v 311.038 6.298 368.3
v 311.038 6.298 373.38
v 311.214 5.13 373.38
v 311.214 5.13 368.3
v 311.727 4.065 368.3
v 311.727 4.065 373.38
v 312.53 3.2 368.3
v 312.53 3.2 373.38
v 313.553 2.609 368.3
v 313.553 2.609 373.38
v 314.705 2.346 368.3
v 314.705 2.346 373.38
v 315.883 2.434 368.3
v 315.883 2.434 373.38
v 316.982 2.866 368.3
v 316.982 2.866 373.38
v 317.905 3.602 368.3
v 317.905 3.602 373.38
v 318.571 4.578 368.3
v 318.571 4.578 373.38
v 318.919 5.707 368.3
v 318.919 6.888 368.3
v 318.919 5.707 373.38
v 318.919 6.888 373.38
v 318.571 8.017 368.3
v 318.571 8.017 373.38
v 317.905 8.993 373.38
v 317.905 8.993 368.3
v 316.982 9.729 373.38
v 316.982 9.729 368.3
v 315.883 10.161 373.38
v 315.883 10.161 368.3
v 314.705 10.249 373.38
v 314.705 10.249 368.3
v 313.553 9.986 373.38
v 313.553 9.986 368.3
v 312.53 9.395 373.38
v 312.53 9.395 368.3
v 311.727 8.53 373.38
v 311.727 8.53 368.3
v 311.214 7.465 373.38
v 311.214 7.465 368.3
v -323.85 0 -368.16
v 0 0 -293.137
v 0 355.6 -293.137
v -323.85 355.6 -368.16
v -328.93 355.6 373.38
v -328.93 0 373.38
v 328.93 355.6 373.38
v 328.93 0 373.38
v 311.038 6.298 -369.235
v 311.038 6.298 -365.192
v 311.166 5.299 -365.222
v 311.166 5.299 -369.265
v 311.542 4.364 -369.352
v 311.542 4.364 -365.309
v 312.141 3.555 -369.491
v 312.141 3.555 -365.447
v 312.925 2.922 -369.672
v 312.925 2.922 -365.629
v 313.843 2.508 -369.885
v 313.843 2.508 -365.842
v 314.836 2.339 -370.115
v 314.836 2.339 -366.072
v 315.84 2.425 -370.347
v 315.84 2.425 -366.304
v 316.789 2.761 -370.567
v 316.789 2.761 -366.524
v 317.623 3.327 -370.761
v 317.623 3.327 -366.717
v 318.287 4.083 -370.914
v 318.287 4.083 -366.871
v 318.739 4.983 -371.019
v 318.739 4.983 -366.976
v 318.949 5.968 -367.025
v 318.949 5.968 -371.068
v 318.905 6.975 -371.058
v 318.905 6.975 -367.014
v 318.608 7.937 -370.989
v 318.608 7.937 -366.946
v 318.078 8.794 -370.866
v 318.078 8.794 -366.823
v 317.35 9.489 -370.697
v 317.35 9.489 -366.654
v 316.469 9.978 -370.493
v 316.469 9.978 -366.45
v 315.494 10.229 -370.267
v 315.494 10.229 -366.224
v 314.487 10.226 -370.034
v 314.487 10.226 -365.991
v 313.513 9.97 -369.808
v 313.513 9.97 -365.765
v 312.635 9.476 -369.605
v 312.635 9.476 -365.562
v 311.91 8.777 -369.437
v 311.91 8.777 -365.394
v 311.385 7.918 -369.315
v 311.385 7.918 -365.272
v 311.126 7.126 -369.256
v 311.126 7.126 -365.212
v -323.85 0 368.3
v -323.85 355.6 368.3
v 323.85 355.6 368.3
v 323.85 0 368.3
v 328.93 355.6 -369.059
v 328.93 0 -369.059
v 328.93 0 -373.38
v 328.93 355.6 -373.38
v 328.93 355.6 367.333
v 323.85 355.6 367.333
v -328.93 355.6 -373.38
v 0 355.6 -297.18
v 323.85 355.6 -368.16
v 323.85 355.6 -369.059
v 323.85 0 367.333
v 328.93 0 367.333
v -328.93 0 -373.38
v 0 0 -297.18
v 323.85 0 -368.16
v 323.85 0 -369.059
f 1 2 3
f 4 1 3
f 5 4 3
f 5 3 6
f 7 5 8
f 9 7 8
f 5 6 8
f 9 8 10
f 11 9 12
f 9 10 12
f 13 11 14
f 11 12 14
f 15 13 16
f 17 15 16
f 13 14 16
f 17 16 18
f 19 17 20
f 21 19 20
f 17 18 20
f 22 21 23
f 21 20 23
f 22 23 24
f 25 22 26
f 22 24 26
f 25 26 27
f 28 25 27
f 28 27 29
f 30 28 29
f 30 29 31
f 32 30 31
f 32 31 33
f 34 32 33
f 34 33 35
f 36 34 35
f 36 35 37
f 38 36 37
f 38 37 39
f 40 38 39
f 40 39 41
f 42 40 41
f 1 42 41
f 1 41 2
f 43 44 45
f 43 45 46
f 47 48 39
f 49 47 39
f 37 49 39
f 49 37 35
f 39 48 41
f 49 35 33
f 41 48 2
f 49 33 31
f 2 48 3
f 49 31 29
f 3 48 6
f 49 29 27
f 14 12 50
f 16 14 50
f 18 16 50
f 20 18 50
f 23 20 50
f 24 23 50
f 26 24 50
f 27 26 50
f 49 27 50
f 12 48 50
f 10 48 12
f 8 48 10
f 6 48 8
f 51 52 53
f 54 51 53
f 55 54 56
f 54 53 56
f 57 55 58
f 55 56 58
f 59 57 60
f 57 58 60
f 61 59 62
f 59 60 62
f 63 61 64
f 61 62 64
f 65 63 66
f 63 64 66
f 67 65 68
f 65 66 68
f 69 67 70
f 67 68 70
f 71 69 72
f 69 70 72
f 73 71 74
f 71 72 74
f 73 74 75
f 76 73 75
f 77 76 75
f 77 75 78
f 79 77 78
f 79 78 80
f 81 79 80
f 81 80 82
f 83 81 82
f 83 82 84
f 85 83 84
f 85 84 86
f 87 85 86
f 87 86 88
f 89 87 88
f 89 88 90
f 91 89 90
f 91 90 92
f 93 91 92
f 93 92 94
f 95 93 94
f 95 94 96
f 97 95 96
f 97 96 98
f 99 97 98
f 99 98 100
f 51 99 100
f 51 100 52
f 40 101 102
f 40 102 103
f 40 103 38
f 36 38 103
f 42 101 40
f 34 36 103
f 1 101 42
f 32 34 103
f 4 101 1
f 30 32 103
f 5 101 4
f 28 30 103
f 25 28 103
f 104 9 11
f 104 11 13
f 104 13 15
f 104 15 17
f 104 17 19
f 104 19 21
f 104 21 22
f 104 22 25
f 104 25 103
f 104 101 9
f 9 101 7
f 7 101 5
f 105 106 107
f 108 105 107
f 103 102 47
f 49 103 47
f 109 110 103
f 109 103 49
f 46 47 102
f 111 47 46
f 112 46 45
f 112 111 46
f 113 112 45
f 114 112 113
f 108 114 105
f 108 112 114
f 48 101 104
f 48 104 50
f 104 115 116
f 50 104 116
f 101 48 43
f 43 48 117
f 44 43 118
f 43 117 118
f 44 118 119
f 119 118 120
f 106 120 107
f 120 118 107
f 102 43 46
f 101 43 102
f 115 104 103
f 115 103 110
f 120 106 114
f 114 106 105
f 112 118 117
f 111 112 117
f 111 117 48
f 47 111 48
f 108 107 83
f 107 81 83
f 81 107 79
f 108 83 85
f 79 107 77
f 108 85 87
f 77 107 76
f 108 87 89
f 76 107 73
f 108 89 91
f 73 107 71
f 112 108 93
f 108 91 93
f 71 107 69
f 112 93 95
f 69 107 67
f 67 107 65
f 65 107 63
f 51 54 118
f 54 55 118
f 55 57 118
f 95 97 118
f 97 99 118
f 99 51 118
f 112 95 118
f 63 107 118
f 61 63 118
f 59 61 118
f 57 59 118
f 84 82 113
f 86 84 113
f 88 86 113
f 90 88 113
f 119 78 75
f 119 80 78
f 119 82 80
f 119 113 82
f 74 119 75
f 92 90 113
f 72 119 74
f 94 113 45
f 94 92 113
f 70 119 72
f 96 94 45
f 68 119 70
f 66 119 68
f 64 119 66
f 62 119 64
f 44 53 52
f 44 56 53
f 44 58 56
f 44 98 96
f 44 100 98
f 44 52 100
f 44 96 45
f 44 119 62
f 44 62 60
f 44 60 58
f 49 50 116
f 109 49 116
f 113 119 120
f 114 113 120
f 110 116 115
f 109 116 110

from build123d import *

# Parameters (mm, degrees)
BOSS_EXTRUDE1_DEPTH = 355.6
SKETCH8_W           = 736.392149349
SKETCH8_H           = 355.6
CUT_EXTRUDE2_DEPTH  = 5.08
CUT_EXTRUDE4_REACH  = 892.111
SKETCH12_R          = 3.9624


with BuildPart() as part:
    # Sketch2 → Boss-Extrude1 (new body)
    with BuildSketch(Plane(origin=(0, 0, 0), x_dir=(1, 0, 0), z_dir=(0, 1, 0))):
        Polygon((-328.93, -373.38), (328.93, -373.38), (328.93, 373.38), (0, 297.18), (-328.93, 373.38), align=None)
        Polygon((-323.85, -368.3), (323.85, -368.3), (323.85, 368.159900717), (0, 293.136734694), (-323.85, 368.159900717), align=None, mode=Mode.SUBTRACT)
    extrude(amount=BOSS_EXTRUDE1_DEPTH)

    # Sketch8 → Cut-Extrude2 (cut)
    with BuildSketch(Plane(origin=(328.93, 0, 0), x_dir=(0, 0, -1), z_dir=(1, 0, 0))):
        with Locations((0.86314386, 177.8)):
            Rectangle(SKETCH8_W, SKETCH8_H)
    extrude(amount=-CUT_EXTRUDE2_DEPTH, mode=Mode.SUBTRACT)

    # Cut-Extrude4: up to this plane
    cut_extrude4_end = Plane(origin=(328.93, 355.6, -373.38), z_dir=(0.22568355160076956, 0, 0.9742006644099884))
    # Sketch12 → Cut-Extrude4 (cut, up to the surface)
    with BuildSketch(Plane.XY.offset(373.38), mode=Mode.PRIVATE) as cut_extrude4_sk1:
        with Locations(Location((315.000794765, 6.297541098, 0), (0, 0, 180))):
            Circle(SKETCH12_R)
    cut_extrude4_tool1 = split(extrude(cut_extrude4_sk1.sketch, amount=-CUT_EXTRUDE4_REACH, mode=Mode.PRIVATE), bisect_by=cut_extrude4_end, keep=Keep.BOTH, mode=Mode.PRIVATE)
    add(cut_extrude4_tool1.solids().sort_by_distance((315.000795, 6.297541, 373.38))[0], mode=Mode.SUBTRACT)


solid = part.part
